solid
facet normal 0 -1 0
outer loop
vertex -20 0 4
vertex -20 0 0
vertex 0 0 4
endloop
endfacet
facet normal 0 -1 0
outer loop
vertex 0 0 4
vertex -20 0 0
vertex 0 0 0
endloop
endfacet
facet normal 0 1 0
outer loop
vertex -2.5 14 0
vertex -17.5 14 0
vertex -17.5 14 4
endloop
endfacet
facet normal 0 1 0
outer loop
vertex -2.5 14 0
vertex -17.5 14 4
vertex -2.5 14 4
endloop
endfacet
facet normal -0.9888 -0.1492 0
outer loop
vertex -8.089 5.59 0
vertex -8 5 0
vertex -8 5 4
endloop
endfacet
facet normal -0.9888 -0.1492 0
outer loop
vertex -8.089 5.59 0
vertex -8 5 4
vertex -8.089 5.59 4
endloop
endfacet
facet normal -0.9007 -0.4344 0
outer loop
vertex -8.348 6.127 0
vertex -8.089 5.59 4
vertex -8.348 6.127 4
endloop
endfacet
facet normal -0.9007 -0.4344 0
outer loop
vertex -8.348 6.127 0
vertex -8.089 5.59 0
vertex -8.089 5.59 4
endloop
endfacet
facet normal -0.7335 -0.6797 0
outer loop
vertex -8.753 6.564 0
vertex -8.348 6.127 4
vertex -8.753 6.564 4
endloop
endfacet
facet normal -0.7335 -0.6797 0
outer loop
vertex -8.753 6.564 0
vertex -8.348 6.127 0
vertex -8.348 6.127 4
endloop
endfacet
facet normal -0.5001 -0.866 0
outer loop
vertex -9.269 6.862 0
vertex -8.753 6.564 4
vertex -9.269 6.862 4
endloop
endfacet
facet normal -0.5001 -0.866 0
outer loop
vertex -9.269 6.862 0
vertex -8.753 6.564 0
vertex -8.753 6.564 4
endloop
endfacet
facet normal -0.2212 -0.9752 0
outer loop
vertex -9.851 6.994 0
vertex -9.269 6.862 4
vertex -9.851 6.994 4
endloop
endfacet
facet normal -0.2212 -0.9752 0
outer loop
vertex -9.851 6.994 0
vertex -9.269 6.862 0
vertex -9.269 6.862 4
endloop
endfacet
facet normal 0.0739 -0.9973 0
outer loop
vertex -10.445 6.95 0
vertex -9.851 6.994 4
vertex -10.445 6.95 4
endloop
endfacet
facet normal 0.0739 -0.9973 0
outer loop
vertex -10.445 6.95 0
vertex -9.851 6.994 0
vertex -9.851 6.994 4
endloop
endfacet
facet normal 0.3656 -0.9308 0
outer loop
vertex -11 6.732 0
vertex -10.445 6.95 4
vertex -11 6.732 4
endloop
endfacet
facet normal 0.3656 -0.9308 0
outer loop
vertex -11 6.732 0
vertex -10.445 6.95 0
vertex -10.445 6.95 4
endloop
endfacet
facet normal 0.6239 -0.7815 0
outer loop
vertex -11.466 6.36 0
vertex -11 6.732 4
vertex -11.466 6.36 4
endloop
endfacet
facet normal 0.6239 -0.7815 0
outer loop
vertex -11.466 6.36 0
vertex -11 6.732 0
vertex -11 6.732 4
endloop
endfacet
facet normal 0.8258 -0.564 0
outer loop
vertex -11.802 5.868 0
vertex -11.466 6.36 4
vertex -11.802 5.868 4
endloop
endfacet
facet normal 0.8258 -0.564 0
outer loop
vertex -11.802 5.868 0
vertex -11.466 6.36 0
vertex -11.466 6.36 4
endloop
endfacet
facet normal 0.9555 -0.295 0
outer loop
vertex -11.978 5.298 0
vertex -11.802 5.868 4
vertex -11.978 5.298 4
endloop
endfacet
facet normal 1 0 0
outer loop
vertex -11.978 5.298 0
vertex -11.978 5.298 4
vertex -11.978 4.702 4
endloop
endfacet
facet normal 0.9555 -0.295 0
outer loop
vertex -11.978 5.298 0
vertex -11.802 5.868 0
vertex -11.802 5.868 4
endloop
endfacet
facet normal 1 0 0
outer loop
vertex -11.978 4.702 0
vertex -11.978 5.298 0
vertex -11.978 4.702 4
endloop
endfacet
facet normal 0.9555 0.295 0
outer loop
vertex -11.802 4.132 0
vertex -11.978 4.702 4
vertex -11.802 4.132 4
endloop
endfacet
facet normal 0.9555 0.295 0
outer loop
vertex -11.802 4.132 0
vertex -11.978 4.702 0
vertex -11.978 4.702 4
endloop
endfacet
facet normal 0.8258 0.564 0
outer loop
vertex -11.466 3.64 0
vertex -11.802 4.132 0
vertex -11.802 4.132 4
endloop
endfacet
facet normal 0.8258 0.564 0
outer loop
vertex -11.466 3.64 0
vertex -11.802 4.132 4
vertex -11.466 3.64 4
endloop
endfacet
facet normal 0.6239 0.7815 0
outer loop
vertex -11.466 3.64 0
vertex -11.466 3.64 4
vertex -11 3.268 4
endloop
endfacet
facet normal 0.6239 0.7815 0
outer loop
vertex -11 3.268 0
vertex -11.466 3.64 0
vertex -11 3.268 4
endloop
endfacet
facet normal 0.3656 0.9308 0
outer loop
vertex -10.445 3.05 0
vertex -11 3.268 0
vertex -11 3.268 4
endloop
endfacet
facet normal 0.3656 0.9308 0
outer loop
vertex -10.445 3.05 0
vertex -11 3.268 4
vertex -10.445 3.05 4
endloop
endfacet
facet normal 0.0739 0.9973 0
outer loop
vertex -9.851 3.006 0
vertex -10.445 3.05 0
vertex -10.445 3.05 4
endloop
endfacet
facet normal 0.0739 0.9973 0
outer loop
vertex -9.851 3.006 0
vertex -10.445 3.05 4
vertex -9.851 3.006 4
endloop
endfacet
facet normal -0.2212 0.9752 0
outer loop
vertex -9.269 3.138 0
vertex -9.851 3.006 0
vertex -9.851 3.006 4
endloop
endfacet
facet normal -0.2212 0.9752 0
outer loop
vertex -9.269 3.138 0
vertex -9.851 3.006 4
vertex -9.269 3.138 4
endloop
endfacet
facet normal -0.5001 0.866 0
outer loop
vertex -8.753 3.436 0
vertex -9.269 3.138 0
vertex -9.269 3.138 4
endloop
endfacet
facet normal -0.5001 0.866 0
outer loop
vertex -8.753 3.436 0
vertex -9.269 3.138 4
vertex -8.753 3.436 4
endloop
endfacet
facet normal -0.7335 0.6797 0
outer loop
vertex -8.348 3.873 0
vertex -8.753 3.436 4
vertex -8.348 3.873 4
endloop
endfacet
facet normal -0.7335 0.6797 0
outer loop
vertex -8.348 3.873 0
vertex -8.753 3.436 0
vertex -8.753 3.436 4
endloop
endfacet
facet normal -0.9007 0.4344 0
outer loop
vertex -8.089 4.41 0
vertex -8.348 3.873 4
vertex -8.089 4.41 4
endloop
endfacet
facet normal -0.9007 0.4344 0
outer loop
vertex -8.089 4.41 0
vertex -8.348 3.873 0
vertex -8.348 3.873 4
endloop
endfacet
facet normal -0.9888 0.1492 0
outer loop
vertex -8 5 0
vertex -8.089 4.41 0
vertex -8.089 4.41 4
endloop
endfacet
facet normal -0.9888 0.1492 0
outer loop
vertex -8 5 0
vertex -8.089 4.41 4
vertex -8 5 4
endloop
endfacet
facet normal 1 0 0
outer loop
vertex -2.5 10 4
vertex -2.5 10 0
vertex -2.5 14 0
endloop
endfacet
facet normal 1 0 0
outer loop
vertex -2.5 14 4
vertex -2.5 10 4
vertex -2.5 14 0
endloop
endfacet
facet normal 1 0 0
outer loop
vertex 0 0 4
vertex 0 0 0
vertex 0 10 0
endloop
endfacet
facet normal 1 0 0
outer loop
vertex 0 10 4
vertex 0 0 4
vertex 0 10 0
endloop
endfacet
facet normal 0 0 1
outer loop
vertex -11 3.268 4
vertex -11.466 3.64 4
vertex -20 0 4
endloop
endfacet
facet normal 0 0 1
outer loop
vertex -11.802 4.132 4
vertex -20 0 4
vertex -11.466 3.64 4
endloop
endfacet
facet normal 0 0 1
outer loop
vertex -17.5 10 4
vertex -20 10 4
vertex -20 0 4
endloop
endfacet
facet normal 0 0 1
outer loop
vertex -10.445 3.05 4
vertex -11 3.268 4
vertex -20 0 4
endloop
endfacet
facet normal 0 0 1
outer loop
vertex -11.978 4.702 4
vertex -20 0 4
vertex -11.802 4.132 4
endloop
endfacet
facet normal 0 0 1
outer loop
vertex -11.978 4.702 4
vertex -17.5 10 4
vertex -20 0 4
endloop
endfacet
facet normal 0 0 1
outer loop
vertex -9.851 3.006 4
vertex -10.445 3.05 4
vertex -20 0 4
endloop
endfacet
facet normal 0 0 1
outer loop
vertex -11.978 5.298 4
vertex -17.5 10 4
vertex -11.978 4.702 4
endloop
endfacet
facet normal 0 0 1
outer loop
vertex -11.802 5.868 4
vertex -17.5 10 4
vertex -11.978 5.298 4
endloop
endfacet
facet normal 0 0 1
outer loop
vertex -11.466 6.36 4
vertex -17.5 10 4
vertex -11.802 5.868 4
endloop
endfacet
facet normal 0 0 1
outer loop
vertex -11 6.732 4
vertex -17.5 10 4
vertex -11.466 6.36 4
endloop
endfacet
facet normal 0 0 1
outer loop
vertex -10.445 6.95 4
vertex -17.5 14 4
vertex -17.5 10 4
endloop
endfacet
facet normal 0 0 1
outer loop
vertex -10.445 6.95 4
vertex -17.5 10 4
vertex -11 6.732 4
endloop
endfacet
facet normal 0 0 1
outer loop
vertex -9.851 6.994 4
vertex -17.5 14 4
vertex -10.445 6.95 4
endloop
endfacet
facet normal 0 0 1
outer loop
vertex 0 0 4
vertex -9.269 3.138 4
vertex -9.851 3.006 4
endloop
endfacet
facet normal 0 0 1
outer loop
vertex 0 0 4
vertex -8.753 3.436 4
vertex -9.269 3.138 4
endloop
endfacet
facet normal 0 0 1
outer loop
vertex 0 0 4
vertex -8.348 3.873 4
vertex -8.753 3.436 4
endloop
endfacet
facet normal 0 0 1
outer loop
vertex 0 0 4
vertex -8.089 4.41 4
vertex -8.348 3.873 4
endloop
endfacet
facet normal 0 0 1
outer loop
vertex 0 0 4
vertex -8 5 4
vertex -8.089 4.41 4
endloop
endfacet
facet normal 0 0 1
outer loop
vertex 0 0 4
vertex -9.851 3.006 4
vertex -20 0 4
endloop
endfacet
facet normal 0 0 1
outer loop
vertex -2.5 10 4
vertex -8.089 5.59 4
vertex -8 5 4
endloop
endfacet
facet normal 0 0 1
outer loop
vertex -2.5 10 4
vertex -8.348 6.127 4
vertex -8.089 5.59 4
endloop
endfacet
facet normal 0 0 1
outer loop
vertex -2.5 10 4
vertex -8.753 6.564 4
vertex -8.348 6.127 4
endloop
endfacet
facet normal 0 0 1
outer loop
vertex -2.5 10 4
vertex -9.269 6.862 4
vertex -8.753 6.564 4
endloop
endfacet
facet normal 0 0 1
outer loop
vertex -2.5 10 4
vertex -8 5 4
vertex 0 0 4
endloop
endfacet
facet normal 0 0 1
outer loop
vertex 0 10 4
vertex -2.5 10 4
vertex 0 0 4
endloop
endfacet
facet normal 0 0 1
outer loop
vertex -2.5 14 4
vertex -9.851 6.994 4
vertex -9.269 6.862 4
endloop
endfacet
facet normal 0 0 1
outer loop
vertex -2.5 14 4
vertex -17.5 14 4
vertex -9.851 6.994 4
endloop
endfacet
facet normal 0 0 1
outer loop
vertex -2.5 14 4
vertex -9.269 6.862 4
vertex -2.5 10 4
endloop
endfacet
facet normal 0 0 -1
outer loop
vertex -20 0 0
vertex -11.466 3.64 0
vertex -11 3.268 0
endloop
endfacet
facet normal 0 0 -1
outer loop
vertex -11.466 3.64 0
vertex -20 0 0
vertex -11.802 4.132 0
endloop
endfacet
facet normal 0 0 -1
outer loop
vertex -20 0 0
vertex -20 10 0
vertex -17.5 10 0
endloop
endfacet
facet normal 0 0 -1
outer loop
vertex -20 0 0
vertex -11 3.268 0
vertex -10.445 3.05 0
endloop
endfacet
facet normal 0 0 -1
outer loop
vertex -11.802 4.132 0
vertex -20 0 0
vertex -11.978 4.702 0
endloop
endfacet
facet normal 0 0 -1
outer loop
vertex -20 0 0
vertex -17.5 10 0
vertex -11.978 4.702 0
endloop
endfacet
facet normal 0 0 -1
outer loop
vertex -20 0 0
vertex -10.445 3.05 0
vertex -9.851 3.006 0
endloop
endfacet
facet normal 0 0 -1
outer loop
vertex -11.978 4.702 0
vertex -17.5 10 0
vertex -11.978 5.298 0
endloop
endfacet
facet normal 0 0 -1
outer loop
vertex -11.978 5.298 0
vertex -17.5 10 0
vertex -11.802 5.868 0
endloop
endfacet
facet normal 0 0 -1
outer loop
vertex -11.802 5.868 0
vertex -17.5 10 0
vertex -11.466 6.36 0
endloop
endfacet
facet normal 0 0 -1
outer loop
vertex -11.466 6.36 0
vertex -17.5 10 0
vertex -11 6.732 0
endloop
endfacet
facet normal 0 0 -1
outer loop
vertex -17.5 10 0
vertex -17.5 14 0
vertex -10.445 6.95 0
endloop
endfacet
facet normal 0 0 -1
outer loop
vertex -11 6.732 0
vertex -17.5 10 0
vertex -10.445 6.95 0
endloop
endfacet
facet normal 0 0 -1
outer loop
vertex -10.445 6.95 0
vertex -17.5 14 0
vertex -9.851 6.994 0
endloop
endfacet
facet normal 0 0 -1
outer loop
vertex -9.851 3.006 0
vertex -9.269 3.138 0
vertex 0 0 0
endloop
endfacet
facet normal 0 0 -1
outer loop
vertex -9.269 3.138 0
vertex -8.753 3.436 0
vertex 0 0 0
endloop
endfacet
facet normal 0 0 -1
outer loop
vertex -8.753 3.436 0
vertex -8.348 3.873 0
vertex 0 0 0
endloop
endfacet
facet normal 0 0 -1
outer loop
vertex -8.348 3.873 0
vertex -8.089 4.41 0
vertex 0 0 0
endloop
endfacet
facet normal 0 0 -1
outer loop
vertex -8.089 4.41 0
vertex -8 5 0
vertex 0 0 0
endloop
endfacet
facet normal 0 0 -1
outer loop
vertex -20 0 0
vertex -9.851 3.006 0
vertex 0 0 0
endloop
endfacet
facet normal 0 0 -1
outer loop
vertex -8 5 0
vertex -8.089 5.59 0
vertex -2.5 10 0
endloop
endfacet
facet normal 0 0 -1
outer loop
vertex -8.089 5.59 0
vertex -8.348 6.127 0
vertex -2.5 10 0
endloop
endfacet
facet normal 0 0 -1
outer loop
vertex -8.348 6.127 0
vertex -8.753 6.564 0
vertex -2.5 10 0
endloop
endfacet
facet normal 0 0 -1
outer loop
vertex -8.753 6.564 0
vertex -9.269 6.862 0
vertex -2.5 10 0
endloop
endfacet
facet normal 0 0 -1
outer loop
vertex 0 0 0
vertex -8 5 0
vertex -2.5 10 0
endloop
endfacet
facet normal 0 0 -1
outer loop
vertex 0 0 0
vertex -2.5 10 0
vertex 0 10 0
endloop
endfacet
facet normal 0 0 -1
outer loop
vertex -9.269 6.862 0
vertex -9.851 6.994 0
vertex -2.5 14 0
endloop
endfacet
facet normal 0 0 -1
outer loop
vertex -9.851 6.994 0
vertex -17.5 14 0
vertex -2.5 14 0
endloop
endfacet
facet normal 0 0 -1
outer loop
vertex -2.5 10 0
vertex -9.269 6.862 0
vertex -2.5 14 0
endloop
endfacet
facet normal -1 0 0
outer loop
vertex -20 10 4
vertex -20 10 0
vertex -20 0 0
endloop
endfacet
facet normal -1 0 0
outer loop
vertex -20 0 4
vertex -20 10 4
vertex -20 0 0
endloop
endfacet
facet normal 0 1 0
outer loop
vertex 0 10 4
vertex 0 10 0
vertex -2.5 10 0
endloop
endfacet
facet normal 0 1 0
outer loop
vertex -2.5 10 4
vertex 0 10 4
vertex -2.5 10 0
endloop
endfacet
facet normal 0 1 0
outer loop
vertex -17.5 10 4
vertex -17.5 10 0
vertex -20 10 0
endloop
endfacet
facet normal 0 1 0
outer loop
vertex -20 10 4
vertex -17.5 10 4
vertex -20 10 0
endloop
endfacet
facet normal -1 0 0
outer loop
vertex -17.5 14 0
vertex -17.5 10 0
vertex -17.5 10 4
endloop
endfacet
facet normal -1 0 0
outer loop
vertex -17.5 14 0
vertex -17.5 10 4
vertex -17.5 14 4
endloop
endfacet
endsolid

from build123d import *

# Parameters (mm, degrees)
F0_R     = 2
F0_W     = 15
F0_H     = 4
F1_DEPTH = 4


with BuildPart() as f1:
    # F0 (on Top) → F1 (new body)
    with BuildSketch(Plane.XY):
        Polygon((-20, 0), (0, 0), (0, 10), (-2.5, 10), (-17.5, 10), (-20, 10), align=None)
        with Locations((-10, 5)):
            Circle(F0_R, mode=Mode.SUBTRACT)
        with Locations((-10, 12)):
            Rectangle(F0_W, F0_H)
    extrude(amount=F1_DEPTH)


solid = f1.part
